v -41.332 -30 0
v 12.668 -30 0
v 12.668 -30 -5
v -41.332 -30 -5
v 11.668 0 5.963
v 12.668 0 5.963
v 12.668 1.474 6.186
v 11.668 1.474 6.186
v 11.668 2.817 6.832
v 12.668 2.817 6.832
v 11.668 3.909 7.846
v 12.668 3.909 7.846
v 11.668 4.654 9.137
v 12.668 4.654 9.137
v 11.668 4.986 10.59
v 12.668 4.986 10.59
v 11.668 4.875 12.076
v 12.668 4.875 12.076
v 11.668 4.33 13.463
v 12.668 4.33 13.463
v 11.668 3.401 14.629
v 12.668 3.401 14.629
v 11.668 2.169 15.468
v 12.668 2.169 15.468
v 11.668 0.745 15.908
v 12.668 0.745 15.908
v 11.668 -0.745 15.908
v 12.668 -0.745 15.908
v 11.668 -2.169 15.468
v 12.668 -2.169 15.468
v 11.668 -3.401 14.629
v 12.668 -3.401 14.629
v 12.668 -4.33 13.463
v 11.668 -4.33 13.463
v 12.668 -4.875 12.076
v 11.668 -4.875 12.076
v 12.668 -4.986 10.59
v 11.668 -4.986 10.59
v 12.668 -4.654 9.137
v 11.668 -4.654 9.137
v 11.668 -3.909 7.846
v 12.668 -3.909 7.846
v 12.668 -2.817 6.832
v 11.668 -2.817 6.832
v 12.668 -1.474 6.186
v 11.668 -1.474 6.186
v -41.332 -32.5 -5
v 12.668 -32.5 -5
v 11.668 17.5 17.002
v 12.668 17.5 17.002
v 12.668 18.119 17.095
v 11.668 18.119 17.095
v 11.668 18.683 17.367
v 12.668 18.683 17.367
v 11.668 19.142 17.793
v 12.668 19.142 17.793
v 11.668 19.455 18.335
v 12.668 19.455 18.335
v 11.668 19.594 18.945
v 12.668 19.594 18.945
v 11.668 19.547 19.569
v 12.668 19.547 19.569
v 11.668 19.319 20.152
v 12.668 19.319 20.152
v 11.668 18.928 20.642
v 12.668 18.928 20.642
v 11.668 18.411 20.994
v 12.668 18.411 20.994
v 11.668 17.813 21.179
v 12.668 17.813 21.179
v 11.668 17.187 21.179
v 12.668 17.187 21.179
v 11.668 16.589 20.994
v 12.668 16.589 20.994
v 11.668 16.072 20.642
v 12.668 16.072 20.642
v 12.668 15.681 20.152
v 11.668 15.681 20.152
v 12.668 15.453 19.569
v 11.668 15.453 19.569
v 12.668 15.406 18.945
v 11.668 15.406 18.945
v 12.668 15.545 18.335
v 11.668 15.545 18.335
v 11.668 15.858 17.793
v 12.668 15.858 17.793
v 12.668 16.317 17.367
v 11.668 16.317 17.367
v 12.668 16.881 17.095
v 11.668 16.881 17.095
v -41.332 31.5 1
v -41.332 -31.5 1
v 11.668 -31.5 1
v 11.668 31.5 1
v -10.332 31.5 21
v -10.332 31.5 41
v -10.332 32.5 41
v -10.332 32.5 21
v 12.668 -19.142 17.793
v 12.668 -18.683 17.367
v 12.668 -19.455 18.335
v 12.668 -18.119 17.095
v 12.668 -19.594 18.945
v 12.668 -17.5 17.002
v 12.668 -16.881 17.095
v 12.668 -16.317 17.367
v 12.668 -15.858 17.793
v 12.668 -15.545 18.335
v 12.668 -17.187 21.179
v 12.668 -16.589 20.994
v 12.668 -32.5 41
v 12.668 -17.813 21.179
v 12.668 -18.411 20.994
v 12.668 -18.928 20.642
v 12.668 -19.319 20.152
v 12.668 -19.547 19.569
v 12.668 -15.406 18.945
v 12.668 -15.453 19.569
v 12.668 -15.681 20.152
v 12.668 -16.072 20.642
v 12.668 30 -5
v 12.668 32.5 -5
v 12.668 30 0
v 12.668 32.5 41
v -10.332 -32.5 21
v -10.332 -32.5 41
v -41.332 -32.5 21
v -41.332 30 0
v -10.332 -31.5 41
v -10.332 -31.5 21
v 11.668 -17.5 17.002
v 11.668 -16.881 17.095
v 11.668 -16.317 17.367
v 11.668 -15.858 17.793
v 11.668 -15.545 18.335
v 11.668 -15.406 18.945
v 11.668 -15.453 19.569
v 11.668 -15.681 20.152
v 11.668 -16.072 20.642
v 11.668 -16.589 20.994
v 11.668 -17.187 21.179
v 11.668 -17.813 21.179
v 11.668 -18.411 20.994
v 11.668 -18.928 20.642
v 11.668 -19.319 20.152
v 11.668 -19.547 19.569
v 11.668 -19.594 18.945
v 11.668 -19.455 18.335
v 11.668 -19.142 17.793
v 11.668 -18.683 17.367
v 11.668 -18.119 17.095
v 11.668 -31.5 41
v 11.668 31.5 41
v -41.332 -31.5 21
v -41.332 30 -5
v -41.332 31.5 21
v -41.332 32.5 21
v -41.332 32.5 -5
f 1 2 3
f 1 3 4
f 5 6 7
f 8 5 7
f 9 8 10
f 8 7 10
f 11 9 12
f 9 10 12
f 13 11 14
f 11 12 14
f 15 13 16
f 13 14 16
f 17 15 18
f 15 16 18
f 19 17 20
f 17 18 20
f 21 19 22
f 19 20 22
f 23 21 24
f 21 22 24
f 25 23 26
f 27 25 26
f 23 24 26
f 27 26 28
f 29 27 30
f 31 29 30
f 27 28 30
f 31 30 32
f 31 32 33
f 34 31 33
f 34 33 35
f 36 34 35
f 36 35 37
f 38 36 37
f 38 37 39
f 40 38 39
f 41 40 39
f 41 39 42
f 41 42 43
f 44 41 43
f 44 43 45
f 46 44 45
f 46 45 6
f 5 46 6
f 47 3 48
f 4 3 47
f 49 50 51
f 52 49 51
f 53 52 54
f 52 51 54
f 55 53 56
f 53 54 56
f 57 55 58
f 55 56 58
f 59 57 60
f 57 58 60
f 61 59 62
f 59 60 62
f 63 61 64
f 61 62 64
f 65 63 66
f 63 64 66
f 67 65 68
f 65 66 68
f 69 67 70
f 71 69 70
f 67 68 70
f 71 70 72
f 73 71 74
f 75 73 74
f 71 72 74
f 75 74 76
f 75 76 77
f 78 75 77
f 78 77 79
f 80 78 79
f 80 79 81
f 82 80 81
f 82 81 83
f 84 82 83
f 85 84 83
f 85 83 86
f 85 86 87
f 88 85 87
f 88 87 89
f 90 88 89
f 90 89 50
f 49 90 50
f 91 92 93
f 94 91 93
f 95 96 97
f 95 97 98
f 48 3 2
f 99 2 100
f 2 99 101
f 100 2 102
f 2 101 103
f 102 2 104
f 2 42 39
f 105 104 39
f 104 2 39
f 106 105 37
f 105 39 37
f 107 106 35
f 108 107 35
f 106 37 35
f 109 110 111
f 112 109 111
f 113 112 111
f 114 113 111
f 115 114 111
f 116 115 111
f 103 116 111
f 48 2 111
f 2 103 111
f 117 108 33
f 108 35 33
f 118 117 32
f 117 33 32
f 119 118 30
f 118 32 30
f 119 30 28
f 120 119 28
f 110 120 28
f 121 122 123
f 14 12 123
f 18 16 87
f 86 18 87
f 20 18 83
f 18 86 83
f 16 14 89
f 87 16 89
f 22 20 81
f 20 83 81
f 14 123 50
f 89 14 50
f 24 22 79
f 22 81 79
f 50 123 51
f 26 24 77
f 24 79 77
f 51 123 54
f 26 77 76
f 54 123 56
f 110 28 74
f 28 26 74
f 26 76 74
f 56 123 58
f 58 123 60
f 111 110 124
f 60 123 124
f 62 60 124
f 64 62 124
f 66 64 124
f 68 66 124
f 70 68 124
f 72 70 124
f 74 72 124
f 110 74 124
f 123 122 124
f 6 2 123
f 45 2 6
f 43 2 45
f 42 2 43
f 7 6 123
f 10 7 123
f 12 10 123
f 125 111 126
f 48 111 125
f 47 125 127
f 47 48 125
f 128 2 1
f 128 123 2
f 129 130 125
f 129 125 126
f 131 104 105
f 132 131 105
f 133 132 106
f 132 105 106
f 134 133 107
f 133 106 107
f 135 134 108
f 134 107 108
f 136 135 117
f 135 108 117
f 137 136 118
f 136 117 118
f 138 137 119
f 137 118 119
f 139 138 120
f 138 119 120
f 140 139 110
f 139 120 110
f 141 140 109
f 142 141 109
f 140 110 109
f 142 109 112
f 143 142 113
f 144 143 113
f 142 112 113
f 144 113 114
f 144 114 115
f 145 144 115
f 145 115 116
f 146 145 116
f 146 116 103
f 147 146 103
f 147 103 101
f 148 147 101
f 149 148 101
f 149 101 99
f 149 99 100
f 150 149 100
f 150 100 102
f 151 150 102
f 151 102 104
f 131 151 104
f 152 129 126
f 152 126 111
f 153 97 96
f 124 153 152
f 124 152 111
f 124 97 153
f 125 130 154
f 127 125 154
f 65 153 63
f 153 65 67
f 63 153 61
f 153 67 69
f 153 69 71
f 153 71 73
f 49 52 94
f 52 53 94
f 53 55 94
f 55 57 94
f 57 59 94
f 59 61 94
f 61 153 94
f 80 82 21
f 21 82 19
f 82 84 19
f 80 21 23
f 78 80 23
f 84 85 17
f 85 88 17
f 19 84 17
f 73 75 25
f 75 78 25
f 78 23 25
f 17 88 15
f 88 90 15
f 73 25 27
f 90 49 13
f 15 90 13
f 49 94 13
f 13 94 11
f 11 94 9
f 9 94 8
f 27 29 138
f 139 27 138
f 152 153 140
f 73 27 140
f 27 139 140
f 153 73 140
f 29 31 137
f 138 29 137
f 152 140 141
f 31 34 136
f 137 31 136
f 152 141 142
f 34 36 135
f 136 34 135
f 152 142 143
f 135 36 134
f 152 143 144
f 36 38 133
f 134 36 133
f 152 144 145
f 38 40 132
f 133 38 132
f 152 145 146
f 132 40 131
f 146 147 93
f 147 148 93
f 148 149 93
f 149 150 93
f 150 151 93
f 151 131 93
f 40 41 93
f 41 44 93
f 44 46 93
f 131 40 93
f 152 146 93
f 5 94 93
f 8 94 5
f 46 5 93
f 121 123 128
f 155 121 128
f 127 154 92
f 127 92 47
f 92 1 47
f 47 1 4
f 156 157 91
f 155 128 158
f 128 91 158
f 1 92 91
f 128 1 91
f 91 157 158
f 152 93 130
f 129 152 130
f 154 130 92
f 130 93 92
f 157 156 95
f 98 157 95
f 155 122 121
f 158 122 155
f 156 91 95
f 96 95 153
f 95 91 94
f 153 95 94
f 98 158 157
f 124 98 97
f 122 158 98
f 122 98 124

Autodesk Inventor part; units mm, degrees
ref_plane "YZ Plane" through (0, 0, 0) normal (1, 0, 0) x (0, 1, 0)
ref_plane "XZ Plane" through (0, 0, 0) normal (0, 1, 0) x (-1, 0, 0)
ref_plane "XY Plane" through (0, 0, 0) normal (0, 0, 1) x (1, 0, 0)
sketch "Sketch1" plane through (0, 0, 0) normal (0, 0, 1) x (1, 0, 0)
  line L0 (-41.3322, 31.5) -> (12.6678, 31.5)
  line L1 (12.6678, 31.5) -> (12.6678, -31.5)
  line L2 (12.6678, -31.5) -> (-41.3322, -31.5)
  line L3 (-41.3322, -31.5) -> (-41.3322, 31.5)
  line L4 (-89.332, 0) -> (29.6678, 0) projected
  point P0 (0, 0)
  dimension "leveys" = 54
  dimension "pituus" = 63
extrude "Extrusion1" add sketch "Sketch1" along normal blind 1
sketch "Sketch2" plane through (0, 0, 1) normal (0, 0, 1) x (1, 0, 0)
  line L0 (12.6678, 31.5) -> (-41.3322, 31.5) projected
  line L1 (-41.3322, -31.5) -> (12.6678, -31.5) projected
  line L2 (12.6678, 31.5) -> (11.6678, 31.5)
  line L3 (11.6678, 31.5) -> (11.6678, -31.5)
  line L4 (11.6678, -31.5) -> (12.6678, -31.5)
  line L5 (12.6678, -31.5) -> (12.6678, 31.5)
  line L6 (11.6678, 30.5) -> (-41.3322, 30.5)
  line L7 (-41.3322, 31.5) -> (-41.3322, -31.5) projected
  line L8 (-41.3322, -30.5) -> (11.6678, -30.5)
  point P0 (0, 0)
  dimension "d4" = 1
  dimension "laita" = 1
  dimension "d9" = 1
extrude "Extrusion2" add sketch "Sketch2" along normal blind 40 contours L5 L1 L3 L0
sketch "Sketch3" plane through (12.6678, -31.5, 0) normal (1, 0, 0) x (0, 0, -1)
  circle A0 centre (-10.9634, 31.5) radius 5
  line L0 (-41, 0) -> (-41, 63) projected
  line L1 (-41, 31.5) -> (34.5285, 31.5) construction
  line L2 (-1, 63) -> (-1, 0) projected
  circle A1 centre (-19.1022, 49) radius 2.1
  circle A2 centre (-19.1022, 14) radius 2.1
  point P0 (0, 31.5)
  dimension "d7" = 10
  dimension "PIKKU" = 4.2
  dimension "d13" = 4.2
  dimension "d14" = 19.3
  dimension "d16" = 35
extrude "Extrusion3" cut sketch "Sketch3" against normal up to next
sketch "Sketch4" plane through (-41.3322, 31.5, 0) normal (0, 1, 0) x (1, 0, 0)
  line L0 (0, 0) -> (54, 0) projected
  line L1 (54, 0) -> (0, 0)
  line L2 (0, 0) -> (0, -21)
  line L3 (0, -21) -> (31, -21)
  line L4 (54, -22.5156) -> (54, 0)
  line L5 (54, 0) -> (54, -41) projected
  line L6 (54, -41) -> (31, -41)
  line L7 (31, -41) -> (31, -21)
  line L8 (54, -22.5156) -> (54, -41)
  point P0 (41.3322, 0)
  dimension "d24" = 20
  dimension "d25" = 23
extrude "Extrusion4" add sketch "Sketch4" along normal blind 1
mirror "Mirror1" about plane through (0, 0, 0) normal (0, 1, 0) of "Extrusion4"
sketch "Sketch7" plane through (0, 0, 0) normal (0, 0, -1) x (-1, 0, 0)
  line L0 (-12.6678, 30) -> (41.3322, 30)
  line L1 (-12.6678, -30) -> (41.3322, -30)
  line L2 (89.332, 0) -> (-29.6678, 0) projected
  line L3 (41.3322, -32.5) -> (41.3322, 32.5) projected
  line L4 (-12.6678, 32.5) -> (-12.6678, -32.5) projected
  line L5 (-12.6678, -32.5) -> (41.3322, -32.5) projected
  line L6 (-12.6678, 32.5) -> (41.3322, 32.5) projected
  point P0 (0, 0)
  dimension "d30" = 60
extrude "Extrusion7" add sketch "Sketch7" along normal blind 5 contours L4 L6 L3 L0 | L1 L3 L5 L4
equation "\"d4\" = laita"
equation "\"d9\" = laita"
equation "\"d13\" = PIKKU"
properties part number "ProjectXBase"
